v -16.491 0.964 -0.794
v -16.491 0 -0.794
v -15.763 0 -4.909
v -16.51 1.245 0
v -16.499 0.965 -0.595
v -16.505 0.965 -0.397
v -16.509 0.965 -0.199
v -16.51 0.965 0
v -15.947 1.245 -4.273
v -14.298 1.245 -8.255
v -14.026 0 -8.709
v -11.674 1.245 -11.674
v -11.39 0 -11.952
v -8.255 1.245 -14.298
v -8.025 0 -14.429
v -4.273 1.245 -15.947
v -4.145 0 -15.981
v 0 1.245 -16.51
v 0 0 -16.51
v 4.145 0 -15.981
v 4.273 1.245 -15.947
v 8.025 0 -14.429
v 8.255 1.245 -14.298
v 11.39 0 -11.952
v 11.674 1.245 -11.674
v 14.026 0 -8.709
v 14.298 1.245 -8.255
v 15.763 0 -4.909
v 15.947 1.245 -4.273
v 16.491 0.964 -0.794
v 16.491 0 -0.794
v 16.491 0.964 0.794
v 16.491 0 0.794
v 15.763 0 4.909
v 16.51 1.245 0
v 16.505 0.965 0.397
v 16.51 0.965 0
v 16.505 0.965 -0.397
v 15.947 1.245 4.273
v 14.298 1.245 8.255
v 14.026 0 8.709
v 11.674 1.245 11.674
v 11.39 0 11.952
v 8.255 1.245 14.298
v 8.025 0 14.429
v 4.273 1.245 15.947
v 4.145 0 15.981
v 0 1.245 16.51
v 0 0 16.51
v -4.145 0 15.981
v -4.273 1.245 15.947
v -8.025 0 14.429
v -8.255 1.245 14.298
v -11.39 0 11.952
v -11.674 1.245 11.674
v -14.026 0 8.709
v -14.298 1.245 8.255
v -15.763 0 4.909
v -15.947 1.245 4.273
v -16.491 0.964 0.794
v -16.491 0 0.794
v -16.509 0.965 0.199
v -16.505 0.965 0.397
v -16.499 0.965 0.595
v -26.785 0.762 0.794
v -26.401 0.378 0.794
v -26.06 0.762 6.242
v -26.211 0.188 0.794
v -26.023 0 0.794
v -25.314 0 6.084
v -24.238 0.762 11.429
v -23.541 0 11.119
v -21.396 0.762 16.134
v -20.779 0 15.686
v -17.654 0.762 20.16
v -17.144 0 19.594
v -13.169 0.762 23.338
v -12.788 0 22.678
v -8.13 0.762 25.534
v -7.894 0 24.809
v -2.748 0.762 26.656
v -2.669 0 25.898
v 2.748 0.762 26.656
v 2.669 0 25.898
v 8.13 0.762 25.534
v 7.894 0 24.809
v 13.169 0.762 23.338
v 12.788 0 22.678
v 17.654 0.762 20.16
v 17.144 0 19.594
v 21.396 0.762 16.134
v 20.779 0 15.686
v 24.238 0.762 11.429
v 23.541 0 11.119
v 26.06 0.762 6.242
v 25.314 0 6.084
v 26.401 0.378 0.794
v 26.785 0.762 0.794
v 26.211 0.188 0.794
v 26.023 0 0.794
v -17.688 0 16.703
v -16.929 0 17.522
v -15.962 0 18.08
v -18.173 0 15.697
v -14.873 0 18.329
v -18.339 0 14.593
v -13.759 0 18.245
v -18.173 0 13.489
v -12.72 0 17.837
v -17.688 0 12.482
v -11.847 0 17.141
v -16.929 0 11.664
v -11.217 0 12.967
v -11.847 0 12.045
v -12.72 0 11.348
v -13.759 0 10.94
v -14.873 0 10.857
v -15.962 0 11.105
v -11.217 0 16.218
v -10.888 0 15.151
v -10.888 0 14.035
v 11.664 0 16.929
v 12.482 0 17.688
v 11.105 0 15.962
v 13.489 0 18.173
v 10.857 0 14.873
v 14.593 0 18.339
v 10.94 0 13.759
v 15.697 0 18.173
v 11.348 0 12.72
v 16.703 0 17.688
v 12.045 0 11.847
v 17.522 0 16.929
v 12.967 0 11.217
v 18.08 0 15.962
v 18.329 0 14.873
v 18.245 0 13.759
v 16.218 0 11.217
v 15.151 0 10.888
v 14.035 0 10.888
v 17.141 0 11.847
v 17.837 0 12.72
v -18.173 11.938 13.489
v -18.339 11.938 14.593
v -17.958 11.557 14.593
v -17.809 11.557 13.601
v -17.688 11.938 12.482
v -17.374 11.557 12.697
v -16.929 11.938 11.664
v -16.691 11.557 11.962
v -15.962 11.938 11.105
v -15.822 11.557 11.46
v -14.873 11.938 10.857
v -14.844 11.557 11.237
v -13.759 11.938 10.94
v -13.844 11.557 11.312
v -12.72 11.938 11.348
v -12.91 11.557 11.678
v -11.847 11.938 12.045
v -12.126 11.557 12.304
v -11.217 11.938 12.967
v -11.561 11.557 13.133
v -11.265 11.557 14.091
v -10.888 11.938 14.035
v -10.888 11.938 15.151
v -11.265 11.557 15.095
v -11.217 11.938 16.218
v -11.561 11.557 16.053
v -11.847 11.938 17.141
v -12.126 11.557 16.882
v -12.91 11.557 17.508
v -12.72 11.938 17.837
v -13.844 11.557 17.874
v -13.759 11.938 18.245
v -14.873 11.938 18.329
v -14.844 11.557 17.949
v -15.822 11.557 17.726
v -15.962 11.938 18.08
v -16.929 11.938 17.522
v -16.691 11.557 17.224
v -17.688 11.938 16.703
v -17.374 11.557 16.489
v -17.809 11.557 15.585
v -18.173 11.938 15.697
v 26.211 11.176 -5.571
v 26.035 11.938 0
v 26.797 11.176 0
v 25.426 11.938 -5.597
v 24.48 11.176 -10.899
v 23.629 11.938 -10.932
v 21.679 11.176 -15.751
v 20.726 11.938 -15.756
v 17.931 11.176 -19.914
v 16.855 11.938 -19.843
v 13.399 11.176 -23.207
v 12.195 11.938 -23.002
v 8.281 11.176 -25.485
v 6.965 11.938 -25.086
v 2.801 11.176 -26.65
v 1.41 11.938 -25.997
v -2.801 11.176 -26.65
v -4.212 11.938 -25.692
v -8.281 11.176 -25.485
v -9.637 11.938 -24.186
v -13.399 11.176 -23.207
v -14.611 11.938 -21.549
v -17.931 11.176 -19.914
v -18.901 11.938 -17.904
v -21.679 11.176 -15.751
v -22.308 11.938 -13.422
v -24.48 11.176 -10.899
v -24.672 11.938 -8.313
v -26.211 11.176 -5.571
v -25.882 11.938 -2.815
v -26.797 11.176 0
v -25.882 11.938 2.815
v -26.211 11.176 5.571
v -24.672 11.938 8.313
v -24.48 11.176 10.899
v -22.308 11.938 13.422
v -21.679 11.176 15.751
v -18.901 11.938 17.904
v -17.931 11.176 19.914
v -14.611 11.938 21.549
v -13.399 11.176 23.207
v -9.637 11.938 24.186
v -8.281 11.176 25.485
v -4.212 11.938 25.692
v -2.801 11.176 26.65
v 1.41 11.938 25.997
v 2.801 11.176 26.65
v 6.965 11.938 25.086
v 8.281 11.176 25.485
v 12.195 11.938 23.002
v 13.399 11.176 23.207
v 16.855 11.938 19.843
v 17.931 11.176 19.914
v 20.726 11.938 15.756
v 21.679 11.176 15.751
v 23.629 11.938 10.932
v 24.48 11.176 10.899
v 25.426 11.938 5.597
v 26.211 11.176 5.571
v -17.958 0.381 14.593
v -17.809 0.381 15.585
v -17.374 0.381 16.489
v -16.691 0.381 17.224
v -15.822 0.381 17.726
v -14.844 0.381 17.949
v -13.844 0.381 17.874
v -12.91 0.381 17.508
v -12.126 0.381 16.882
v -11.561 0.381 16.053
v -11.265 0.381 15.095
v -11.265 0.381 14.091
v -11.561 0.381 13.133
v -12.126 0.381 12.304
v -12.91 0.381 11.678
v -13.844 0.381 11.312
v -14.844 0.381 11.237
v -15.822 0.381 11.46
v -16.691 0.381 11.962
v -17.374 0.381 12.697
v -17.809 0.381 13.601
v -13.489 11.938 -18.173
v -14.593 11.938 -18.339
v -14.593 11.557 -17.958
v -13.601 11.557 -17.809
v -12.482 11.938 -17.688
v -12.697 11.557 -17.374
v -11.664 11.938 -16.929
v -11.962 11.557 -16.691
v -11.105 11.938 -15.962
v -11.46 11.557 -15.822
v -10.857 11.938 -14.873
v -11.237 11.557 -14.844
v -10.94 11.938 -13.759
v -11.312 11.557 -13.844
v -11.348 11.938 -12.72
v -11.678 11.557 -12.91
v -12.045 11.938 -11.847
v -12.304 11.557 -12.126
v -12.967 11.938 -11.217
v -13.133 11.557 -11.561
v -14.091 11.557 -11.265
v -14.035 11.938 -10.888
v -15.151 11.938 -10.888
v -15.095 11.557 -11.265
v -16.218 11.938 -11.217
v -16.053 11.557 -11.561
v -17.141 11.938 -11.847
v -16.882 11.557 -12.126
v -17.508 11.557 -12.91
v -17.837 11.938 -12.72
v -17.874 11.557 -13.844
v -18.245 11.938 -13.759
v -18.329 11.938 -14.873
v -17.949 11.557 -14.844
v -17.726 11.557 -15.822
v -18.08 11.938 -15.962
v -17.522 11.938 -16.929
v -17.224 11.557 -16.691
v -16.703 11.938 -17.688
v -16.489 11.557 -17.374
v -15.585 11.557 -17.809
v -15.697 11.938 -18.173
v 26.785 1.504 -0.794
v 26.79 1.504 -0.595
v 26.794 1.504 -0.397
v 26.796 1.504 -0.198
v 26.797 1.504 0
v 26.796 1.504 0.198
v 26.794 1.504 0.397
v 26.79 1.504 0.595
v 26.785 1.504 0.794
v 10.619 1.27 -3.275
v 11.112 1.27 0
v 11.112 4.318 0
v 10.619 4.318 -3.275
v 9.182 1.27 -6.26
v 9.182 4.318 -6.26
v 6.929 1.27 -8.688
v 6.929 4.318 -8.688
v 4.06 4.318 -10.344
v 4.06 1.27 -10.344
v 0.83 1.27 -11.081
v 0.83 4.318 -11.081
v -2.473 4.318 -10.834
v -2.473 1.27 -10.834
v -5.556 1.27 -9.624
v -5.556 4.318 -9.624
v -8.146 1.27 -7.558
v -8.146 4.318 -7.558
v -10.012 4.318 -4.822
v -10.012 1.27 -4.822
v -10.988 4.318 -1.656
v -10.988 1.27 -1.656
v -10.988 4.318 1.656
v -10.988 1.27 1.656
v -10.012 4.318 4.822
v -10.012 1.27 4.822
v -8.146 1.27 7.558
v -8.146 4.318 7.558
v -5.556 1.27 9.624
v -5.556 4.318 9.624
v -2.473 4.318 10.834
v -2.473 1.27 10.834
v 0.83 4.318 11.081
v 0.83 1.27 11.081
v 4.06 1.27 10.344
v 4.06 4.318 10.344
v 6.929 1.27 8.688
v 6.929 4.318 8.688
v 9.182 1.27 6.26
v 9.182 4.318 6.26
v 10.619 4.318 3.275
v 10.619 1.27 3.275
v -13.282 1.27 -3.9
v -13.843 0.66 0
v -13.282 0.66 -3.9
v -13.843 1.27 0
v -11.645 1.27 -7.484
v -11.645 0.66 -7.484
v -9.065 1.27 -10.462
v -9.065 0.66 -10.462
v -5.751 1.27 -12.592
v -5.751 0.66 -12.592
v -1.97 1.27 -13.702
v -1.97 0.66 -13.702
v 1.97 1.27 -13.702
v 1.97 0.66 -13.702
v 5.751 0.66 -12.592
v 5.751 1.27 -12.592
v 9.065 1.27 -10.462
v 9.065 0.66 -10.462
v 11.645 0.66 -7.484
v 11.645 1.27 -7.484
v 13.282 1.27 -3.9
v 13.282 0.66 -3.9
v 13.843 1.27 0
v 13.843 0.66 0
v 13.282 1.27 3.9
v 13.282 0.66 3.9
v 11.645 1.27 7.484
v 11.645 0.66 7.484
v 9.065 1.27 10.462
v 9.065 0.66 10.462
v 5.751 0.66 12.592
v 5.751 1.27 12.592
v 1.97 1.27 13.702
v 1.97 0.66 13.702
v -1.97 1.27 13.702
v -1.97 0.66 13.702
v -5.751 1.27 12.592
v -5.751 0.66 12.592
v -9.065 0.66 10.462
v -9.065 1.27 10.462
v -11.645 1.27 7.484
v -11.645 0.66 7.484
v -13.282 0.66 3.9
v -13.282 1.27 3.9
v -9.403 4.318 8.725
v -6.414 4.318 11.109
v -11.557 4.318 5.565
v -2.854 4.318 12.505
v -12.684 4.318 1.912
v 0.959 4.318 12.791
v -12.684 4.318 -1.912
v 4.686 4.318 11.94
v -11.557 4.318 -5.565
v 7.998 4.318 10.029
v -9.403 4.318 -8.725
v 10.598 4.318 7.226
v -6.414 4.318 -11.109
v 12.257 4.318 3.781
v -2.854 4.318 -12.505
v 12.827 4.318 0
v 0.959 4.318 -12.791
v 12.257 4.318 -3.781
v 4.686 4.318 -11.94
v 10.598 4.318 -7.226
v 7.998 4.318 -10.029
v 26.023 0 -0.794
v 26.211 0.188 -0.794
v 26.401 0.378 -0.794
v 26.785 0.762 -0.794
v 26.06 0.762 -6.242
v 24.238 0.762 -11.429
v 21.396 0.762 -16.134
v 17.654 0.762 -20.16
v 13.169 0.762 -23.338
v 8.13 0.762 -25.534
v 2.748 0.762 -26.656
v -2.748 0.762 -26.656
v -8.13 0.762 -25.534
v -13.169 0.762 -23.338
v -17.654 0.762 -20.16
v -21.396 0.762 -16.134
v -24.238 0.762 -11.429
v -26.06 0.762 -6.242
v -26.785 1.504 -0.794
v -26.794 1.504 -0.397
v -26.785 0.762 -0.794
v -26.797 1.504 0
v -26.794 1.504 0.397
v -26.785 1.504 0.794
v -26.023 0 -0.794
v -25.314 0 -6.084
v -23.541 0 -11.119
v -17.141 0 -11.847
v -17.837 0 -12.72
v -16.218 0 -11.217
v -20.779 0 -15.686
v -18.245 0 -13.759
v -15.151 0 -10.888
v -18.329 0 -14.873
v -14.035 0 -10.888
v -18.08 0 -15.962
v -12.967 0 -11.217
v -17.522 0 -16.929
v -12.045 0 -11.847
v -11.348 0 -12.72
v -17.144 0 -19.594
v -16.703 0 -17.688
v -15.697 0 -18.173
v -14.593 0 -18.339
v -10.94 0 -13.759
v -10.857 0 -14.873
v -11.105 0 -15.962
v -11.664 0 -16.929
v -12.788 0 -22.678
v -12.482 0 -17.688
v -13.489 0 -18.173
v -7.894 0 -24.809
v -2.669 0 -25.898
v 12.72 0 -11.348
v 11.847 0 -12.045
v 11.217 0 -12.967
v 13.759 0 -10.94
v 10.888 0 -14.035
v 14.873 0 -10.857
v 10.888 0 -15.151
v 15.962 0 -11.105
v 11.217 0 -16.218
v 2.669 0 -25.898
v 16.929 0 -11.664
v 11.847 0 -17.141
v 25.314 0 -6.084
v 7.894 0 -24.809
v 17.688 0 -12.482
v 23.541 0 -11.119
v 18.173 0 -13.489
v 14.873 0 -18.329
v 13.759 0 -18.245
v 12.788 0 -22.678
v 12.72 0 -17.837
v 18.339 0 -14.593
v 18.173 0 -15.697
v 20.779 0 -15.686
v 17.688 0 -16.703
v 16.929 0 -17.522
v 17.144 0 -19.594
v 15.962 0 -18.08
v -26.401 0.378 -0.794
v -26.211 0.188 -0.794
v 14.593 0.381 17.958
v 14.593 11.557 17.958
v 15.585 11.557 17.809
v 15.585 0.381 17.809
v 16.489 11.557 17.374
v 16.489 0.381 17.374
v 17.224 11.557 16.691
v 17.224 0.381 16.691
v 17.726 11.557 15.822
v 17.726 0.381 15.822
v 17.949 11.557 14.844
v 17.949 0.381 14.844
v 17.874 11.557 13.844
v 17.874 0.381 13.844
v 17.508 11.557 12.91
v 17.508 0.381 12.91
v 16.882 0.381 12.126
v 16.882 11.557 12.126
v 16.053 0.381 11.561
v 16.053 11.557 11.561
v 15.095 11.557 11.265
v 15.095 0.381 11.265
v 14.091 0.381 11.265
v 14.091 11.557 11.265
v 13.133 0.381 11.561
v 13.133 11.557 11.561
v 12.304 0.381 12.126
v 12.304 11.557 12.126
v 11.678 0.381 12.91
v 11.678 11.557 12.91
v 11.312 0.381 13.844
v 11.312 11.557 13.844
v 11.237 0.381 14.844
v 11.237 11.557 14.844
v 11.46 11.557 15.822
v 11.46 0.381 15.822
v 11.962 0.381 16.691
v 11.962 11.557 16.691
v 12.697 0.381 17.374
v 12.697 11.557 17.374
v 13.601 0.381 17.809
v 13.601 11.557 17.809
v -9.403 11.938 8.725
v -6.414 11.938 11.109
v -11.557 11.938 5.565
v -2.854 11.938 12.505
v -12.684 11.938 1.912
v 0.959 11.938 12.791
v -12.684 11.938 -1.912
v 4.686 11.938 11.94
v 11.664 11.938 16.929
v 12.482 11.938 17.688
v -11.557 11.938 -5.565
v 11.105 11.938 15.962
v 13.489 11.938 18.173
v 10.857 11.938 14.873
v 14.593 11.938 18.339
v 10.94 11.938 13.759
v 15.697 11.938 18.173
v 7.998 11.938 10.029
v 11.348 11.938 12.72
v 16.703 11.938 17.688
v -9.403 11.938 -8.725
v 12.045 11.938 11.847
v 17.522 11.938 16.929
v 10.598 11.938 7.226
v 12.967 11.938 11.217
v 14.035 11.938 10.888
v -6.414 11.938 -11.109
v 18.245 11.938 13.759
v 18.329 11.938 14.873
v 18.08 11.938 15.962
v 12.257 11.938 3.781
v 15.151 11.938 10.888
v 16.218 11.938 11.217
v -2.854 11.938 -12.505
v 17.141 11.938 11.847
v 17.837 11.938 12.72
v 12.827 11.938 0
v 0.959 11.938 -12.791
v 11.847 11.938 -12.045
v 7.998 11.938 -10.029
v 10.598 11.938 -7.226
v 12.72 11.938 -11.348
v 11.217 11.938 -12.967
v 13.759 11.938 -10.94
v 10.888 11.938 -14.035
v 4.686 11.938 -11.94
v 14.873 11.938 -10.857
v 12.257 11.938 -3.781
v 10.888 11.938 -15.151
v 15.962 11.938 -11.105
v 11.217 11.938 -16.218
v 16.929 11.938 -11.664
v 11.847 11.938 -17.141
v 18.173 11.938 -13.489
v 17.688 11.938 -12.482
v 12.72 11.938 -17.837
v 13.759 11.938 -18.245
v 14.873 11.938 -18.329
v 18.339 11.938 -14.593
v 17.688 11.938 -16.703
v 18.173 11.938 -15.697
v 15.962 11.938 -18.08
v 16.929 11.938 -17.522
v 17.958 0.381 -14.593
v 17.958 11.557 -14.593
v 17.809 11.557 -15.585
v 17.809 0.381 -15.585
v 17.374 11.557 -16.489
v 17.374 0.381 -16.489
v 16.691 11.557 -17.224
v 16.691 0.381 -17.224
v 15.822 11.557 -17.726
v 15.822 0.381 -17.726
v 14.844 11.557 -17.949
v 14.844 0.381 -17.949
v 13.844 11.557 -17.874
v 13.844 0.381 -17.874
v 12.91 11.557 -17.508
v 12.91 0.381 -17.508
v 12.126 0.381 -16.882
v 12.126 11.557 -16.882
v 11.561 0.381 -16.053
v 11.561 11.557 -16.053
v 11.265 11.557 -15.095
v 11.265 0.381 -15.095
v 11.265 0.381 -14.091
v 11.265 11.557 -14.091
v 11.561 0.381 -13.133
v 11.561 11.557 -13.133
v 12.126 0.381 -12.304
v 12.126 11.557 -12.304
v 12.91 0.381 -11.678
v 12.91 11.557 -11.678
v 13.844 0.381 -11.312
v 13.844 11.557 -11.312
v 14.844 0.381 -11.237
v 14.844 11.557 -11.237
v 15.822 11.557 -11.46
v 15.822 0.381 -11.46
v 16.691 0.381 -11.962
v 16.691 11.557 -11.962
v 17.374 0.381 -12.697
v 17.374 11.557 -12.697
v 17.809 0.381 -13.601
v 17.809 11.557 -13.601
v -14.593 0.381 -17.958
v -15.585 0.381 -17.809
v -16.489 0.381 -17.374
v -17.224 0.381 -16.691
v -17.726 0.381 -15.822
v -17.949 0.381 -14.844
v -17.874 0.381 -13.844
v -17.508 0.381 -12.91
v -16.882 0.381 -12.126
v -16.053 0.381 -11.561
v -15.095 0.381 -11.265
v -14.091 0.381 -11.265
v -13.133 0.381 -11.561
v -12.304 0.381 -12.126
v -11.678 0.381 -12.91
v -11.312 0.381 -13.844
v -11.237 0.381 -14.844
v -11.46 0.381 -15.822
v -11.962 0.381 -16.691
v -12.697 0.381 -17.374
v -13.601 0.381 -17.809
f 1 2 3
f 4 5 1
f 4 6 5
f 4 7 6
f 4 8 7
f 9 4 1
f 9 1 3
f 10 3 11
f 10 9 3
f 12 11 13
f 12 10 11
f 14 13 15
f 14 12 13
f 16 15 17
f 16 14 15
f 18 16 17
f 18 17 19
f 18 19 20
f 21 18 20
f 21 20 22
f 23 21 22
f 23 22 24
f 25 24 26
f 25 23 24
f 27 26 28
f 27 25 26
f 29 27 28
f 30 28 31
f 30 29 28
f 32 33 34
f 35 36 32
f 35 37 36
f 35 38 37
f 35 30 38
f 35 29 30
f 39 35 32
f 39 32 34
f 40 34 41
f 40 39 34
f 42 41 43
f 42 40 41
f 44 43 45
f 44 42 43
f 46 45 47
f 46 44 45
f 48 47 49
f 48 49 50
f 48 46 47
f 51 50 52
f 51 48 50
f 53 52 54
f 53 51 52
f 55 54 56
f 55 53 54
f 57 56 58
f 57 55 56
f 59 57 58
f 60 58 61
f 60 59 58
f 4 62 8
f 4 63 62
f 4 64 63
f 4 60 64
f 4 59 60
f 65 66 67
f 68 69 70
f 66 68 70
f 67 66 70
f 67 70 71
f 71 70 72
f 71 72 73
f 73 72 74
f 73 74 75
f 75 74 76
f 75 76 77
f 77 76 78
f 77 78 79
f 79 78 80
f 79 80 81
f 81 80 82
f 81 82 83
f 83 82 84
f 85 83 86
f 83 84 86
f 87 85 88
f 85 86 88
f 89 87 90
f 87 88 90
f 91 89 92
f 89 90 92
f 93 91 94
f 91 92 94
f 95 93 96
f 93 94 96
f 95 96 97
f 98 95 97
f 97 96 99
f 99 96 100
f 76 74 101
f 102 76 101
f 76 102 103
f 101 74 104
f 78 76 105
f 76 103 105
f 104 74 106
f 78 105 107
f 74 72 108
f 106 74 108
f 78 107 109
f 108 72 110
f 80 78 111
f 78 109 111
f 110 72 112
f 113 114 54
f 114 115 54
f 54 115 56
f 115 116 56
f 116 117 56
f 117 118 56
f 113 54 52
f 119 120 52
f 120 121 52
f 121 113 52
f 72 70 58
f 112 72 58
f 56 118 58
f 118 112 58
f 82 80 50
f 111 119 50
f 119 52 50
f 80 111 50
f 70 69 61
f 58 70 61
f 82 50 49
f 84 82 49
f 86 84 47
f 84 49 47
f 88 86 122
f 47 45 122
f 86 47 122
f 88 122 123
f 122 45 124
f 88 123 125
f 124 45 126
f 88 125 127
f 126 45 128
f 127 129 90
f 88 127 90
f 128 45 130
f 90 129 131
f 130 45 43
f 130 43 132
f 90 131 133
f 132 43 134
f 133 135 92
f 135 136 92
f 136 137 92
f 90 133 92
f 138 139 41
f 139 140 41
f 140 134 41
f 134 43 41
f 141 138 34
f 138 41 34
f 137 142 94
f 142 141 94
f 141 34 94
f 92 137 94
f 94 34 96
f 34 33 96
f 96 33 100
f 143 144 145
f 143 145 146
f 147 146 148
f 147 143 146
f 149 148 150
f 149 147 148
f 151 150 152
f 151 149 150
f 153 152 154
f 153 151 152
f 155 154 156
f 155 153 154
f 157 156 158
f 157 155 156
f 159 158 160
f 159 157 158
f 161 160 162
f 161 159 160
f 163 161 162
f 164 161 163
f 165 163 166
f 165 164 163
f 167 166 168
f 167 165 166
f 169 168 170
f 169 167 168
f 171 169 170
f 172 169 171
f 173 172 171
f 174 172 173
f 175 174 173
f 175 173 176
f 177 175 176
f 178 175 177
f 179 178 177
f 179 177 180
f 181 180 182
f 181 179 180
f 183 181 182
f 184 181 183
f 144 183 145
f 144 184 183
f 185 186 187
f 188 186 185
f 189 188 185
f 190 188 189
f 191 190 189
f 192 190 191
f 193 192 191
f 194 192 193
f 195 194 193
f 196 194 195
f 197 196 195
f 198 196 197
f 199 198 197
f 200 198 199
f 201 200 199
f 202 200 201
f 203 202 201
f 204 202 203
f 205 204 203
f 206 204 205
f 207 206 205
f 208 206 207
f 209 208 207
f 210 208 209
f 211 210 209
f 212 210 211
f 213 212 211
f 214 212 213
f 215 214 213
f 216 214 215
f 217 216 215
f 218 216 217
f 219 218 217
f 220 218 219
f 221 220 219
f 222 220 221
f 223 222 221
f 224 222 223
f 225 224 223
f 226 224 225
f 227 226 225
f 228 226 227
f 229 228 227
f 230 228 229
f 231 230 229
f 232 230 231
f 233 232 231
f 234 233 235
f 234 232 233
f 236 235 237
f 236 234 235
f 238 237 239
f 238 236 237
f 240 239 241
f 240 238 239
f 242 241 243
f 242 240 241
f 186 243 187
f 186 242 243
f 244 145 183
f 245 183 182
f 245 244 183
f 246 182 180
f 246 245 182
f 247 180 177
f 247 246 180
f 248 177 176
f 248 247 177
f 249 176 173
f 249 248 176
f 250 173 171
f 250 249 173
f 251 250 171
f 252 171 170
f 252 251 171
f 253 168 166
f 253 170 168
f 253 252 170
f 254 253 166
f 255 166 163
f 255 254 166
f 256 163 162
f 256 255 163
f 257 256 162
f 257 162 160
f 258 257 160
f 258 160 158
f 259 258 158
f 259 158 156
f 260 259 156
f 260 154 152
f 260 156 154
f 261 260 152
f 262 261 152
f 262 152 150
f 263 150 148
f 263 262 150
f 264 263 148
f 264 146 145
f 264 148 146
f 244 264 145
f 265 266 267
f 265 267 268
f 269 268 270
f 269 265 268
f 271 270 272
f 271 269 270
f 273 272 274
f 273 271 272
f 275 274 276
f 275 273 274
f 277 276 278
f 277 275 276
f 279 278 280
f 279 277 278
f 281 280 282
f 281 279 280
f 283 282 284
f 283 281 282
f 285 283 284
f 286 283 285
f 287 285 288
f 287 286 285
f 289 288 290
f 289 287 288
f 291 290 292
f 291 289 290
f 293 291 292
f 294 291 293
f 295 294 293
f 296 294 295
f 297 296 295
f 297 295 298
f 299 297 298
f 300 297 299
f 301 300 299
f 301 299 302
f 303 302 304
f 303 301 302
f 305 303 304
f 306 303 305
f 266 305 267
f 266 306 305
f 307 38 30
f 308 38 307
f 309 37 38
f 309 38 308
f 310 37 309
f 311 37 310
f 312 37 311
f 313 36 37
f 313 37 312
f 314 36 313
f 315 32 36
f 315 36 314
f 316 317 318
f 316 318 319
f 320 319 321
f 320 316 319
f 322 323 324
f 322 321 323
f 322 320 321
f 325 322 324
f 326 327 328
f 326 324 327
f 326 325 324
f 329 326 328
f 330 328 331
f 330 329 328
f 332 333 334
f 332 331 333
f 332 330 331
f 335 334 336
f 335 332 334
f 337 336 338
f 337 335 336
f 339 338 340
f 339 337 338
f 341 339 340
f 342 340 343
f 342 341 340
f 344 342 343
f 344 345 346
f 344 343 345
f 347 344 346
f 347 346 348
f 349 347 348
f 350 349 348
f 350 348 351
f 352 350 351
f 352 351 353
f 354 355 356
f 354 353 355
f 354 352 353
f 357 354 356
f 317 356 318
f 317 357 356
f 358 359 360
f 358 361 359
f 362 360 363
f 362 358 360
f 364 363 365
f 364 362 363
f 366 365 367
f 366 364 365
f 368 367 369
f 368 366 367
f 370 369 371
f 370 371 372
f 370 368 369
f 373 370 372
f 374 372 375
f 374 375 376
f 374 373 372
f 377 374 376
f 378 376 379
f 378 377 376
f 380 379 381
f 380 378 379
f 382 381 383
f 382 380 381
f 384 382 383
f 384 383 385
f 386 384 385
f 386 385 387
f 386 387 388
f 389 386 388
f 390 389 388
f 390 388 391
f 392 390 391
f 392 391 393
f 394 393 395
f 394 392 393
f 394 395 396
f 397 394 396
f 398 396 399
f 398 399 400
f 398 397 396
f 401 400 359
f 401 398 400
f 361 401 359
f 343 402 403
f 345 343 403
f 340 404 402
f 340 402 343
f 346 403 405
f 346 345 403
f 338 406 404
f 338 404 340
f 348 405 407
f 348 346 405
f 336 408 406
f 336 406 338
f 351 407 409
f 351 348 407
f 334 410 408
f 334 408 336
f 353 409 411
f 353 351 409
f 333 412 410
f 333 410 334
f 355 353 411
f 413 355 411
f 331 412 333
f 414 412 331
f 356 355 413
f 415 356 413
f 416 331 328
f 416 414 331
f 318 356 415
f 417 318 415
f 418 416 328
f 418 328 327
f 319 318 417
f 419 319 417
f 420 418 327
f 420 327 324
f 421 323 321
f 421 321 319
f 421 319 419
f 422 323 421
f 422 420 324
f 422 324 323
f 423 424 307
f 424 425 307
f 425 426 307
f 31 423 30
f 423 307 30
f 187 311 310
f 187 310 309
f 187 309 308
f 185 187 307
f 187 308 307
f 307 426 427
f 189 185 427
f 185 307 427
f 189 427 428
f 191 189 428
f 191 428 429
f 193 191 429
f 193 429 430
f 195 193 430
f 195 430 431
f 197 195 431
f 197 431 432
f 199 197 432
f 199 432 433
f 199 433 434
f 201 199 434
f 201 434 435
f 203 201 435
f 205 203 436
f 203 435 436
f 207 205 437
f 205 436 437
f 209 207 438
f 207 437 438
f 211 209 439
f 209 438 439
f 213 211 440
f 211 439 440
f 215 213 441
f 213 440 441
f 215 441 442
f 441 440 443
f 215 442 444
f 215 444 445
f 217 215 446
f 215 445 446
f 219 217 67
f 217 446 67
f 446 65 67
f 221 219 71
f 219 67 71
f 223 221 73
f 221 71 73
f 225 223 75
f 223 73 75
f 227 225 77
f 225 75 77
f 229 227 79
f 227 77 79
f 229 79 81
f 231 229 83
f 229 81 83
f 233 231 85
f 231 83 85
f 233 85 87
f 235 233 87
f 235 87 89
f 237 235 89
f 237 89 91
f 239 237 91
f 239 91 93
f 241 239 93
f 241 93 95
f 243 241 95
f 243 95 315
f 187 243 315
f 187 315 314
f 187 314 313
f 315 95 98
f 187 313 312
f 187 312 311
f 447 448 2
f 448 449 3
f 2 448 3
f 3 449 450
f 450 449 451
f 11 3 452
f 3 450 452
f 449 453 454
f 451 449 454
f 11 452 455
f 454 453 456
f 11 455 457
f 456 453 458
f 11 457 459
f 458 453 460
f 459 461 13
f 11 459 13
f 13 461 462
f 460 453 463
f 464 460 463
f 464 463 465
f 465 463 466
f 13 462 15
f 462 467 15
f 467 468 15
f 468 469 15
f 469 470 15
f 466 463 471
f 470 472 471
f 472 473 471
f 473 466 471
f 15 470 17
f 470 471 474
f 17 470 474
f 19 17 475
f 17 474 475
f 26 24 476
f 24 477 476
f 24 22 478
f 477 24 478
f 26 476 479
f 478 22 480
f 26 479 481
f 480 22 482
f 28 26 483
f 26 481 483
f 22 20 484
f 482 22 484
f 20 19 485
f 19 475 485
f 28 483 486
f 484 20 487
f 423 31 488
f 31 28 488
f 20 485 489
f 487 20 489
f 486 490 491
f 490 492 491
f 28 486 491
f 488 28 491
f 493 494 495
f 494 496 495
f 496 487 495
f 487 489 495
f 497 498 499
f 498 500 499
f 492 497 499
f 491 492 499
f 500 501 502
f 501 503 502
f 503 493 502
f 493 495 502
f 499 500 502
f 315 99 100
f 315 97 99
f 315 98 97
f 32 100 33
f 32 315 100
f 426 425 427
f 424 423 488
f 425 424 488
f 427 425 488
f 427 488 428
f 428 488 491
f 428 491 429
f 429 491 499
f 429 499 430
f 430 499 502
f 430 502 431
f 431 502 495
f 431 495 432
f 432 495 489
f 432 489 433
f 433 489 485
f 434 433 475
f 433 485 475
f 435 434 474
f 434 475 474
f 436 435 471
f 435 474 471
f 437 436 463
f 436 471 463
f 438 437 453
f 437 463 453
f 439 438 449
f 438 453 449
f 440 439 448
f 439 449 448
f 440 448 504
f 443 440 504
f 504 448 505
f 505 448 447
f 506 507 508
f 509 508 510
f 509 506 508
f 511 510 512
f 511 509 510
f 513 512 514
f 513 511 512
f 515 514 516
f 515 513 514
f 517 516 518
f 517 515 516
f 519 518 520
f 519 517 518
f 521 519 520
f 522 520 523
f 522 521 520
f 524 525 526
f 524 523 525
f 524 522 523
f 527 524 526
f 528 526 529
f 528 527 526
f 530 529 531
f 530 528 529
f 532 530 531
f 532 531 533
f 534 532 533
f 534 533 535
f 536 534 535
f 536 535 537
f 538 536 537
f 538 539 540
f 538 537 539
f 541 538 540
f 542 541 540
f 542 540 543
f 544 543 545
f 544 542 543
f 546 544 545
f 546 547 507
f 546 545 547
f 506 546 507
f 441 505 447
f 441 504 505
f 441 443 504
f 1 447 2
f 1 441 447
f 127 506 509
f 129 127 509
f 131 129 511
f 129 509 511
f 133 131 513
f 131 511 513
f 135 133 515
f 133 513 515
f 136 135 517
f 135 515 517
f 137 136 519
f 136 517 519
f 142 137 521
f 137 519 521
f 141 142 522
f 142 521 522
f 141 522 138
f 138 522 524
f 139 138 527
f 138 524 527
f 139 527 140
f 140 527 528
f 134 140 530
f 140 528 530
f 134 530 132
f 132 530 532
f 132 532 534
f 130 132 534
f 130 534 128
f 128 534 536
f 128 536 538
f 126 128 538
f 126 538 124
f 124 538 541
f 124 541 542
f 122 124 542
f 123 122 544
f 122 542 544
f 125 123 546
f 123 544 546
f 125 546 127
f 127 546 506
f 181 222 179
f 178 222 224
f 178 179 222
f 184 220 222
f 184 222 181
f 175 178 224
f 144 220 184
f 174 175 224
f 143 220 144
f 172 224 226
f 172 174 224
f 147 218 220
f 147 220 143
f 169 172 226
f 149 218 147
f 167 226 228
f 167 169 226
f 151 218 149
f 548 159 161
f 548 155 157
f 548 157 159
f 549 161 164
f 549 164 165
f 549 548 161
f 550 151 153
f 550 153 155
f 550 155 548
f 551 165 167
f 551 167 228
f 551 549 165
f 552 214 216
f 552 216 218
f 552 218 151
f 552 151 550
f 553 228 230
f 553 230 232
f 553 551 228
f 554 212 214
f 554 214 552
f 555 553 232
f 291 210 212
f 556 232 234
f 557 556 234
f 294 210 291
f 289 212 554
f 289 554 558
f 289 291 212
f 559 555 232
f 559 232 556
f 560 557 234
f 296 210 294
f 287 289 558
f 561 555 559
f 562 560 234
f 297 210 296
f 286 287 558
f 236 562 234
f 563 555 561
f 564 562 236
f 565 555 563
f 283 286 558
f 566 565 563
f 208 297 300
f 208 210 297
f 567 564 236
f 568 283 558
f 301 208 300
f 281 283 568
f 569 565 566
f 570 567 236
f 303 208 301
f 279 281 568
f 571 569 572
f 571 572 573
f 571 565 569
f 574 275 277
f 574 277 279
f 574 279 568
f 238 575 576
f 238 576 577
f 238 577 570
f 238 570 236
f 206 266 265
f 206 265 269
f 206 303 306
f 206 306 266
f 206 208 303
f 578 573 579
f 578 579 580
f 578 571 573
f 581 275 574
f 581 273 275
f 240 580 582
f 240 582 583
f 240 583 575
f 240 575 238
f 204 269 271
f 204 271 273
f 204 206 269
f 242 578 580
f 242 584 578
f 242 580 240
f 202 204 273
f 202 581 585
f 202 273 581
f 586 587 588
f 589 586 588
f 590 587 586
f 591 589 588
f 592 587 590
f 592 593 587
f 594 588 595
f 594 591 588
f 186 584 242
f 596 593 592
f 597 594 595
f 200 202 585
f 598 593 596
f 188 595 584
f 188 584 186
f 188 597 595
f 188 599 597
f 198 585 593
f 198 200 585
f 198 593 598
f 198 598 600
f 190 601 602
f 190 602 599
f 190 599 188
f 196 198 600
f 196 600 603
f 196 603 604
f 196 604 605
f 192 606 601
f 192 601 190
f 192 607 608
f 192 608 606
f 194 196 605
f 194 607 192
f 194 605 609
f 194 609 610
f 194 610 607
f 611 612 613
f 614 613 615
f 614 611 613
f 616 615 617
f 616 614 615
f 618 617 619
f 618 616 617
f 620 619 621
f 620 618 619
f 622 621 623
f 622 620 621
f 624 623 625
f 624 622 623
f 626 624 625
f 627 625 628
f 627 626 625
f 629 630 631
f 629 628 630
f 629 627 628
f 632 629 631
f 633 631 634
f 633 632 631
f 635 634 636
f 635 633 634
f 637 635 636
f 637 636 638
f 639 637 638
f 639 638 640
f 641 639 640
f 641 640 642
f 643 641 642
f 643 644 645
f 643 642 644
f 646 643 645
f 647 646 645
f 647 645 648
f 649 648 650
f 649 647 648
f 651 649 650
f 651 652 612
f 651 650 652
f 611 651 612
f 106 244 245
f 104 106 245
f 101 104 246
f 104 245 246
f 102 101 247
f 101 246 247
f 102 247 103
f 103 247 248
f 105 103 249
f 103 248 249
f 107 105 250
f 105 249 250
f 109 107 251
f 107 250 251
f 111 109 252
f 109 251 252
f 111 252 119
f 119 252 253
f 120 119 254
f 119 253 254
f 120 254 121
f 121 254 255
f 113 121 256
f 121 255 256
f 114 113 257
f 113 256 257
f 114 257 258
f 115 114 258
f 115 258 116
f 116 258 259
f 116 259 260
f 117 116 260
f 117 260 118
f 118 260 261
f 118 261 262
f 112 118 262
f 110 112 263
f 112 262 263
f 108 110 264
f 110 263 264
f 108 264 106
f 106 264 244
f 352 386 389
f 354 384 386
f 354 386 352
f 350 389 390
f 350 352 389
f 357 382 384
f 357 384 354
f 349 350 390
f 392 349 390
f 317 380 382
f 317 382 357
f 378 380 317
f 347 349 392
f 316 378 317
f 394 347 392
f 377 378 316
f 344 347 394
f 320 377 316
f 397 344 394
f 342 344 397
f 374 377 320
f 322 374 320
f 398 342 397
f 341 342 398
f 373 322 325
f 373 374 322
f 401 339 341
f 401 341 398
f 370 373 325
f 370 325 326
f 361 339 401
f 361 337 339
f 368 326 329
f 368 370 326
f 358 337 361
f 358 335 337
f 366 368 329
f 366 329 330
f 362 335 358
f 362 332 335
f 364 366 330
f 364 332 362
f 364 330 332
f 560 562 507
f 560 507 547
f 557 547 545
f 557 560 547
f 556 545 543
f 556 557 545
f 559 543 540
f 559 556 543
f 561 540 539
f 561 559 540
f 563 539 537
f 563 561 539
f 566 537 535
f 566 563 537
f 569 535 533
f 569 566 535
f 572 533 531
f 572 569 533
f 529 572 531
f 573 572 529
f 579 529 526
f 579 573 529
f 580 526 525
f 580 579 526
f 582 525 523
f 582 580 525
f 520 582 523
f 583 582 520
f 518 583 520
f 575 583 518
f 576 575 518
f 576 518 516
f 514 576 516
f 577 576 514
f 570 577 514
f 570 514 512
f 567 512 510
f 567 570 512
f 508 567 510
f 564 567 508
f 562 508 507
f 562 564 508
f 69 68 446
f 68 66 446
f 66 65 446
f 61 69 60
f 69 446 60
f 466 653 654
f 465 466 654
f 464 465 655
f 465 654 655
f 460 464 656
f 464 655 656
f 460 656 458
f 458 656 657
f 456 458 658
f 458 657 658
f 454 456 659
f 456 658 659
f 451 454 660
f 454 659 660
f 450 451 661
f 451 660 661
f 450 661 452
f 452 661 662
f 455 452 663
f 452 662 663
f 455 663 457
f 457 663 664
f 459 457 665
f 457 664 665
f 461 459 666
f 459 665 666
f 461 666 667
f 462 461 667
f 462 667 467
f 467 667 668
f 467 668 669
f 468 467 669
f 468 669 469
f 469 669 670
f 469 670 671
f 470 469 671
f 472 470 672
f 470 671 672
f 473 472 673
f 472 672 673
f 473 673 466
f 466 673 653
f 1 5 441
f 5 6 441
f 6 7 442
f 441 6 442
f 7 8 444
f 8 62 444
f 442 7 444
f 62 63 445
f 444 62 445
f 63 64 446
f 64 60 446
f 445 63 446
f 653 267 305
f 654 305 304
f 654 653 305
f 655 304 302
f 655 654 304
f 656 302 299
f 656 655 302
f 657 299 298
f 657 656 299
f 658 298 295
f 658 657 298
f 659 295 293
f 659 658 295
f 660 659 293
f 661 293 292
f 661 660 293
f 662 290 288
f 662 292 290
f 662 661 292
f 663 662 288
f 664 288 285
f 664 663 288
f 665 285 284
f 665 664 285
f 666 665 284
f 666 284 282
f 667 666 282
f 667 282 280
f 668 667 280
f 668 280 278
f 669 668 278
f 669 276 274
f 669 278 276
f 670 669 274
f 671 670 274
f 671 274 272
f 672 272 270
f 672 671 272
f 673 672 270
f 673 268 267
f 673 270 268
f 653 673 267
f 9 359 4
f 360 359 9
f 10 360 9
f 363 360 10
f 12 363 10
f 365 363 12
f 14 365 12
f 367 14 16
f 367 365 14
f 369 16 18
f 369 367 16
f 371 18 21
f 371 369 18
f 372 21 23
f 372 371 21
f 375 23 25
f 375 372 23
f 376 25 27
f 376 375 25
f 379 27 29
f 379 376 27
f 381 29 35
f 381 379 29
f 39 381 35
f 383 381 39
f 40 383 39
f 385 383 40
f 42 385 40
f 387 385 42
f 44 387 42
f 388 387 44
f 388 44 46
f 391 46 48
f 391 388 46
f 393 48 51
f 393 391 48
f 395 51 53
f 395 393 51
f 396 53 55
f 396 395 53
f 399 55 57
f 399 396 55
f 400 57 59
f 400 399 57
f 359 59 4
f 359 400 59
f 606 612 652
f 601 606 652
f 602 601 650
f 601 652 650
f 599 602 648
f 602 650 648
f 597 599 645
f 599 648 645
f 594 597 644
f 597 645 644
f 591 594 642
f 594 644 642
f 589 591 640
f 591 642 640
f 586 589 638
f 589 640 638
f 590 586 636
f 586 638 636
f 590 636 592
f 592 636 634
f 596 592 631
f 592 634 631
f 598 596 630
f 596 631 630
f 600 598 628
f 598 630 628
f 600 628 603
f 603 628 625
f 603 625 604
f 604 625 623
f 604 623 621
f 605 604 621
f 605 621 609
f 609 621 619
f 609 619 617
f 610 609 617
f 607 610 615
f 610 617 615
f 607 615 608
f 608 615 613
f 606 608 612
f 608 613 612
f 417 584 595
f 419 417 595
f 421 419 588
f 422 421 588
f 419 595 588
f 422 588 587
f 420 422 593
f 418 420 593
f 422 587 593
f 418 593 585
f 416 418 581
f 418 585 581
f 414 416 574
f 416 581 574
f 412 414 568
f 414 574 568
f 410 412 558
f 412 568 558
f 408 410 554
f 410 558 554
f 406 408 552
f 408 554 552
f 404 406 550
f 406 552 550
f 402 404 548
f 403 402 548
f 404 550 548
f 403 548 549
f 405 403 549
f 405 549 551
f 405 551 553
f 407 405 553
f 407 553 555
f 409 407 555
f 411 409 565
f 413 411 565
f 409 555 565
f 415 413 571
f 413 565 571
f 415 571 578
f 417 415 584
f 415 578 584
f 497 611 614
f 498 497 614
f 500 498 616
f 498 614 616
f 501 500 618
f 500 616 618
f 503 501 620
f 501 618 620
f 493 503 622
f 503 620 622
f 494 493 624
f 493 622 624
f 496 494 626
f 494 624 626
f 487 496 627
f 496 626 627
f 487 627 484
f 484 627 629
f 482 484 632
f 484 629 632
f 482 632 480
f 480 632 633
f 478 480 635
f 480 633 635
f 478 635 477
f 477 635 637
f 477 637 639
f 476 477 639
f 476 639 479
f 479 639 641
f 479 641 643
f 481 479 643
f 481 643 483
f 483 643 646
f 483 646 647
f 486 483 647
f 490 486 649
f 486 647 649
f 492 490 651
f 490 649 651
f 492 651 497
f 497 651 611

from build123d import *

# Parameters (mm, degrees)
SKETCH1_R                    = 26.797
SKETCH1_R_2                  = 11.1125
BOSS_EXTRUDE1_DEPTH          = 11.938
SKETCH2_R                    = 12.827
CUT_EXTRUDE1_DEPTH           = 7.62
CHAMFER1_SIZE                = 0.762
SKETCH4_R                    = 3.3655
CUT_EXTRUDE2_DEPTH           = 12.938
CHAMFER2_SIZE                = 0.381
CIRPATTERN1_COUNT            = 4
CHAMFER2_OF_CIRPATTERN1_SIZE = 0.381
CUT_EXTRUDE5_DEPTH           = 0.79375


with BuildPart() as part:
    # Sketch1 → Boss-Extrude1 (new body)
    with BuildSketch(Plane(origin=(0, 0, 0), x_dir=(1, 0, 0), z_dir=(0, 1, 0))):
        Circle(SKETCH1_R)
        Circle(SKETCH1_R_2, mode=Mode.SUBTRACT)
    extrude(amount=BOSS_EXTRUDE1_DEPTH)

    # Sketch2 → Cut-Extrude1 (cut)
    with BuildSketch(Plane(origin=(0, 11.938, 0), x_dir=(1, 0, 0), z_dir=(0, 1, 0))):
        Circle(SKETCH2_R)
    extrude(amount=-CUT_EXTRUDE1_DEPTH, mode=Mode.SUBTRACT)

    # Chamfer1
    chamfer1_edges = [part.edges().sort_by_distance(p)[0] for p in [
        (-26.797, 0, 0),
        (-26.797, 11.938, 0),
    ]]
    chamfer(chamfer1_edges, length=CHAMFER1_SIZE)

    # Sketch3 → Cut-Revolve1 (revolve, cut)
    with BuildSketch(Plane.XY):
        Polygon((-16.51, 0), (-16.51, 1.2446), (-13.843, 0.6604), (-13.843, 1.27), (0, 1.27), (0, 0), align=None)
    revolve(axis=Axis((0, 11.938, 0), (0, -1, 0)), mode=Mode.SUBTRACT)

    # Sketch4 → Cut-Extrude2 (cut, through all)
    with BuildSketch(Plane(origin=(0, 0, 0), x_dir=(1, 0, 0), z_dir=(0, 1, 0))):
        with Locations((14.592916197, 14.592916197)):
            Circle(SKETCH4_R)
    cut_extrude2 = extrude(amount=CUT_EXTRUDE2_DEPTH, mode=Mode.SUBTRACT)

    # Chamfer2
    chamfer2_edges = [part.edges().sort_by_distance(p)[0] for p in [
        (11.227416197, 0, -14.592916197),
        (11.227416197, 11.938, -14.592916197),
    ]]
    chamfer(chamfer2_edges, length=CHAMFER2_SIZE)

    # CirPattern1: Cut-Extrude2 ×4 about axis
    cirpattern1_axis = Axis((0, 0, 0), (0, 1, 0))
    for i in range(1, CIRPATTERN1_COUNT):
        add(cut_extrude2.rotate(cirpattern1_axis, i * 360 / CIRPATTERN1_COUNT), mode=Mode.SUBTRACT)

    # Chamfer2 of CirPattern1
    chamfer2_of_cirpattern1_edges = [part.edges().sort_by_distance(p)[0] for p in [
        (-14.592916197, 0, -11.227416197),
        (-14.592916197, 11.938, -11.227416197),
        (-11.227416197, 0, 14.592916197),
        (-11.227416197, 11.938, 14.592916197),
        (14.592916197, 0, 11.227416197),
        (14.592916197, 11.938, 11.227416197),
    ]]
    chamfer(chamfer2_of_cirpattern1_edges, length=CHAMFER2_OF_CIRPATTERN1_SIZE)

    # Sketch5 → Cut-Extrude5 (cut, symmetric)
    with BuildSketch(Plane.XY):
        Polygon((-15.875, 0.931973496), (-28.575, 1.597552293), (-28.575, 0), (-15.875, 0), align=None)
    cut_extrude5 = extrude(amount=CUT_EXTRUDE5_DEPTH, both=True, mode=Mode.SUBTRACT)

    # Mirror1: Cut-Extrude5 across plane
    add(cut_extrude5.mirror(Plane(origin=(0, 0, 0), x_dir=(0, 0, 1), z_dir=(1, 0, 0))), mode=Mode.SUBTRACT)


solid = part.part
